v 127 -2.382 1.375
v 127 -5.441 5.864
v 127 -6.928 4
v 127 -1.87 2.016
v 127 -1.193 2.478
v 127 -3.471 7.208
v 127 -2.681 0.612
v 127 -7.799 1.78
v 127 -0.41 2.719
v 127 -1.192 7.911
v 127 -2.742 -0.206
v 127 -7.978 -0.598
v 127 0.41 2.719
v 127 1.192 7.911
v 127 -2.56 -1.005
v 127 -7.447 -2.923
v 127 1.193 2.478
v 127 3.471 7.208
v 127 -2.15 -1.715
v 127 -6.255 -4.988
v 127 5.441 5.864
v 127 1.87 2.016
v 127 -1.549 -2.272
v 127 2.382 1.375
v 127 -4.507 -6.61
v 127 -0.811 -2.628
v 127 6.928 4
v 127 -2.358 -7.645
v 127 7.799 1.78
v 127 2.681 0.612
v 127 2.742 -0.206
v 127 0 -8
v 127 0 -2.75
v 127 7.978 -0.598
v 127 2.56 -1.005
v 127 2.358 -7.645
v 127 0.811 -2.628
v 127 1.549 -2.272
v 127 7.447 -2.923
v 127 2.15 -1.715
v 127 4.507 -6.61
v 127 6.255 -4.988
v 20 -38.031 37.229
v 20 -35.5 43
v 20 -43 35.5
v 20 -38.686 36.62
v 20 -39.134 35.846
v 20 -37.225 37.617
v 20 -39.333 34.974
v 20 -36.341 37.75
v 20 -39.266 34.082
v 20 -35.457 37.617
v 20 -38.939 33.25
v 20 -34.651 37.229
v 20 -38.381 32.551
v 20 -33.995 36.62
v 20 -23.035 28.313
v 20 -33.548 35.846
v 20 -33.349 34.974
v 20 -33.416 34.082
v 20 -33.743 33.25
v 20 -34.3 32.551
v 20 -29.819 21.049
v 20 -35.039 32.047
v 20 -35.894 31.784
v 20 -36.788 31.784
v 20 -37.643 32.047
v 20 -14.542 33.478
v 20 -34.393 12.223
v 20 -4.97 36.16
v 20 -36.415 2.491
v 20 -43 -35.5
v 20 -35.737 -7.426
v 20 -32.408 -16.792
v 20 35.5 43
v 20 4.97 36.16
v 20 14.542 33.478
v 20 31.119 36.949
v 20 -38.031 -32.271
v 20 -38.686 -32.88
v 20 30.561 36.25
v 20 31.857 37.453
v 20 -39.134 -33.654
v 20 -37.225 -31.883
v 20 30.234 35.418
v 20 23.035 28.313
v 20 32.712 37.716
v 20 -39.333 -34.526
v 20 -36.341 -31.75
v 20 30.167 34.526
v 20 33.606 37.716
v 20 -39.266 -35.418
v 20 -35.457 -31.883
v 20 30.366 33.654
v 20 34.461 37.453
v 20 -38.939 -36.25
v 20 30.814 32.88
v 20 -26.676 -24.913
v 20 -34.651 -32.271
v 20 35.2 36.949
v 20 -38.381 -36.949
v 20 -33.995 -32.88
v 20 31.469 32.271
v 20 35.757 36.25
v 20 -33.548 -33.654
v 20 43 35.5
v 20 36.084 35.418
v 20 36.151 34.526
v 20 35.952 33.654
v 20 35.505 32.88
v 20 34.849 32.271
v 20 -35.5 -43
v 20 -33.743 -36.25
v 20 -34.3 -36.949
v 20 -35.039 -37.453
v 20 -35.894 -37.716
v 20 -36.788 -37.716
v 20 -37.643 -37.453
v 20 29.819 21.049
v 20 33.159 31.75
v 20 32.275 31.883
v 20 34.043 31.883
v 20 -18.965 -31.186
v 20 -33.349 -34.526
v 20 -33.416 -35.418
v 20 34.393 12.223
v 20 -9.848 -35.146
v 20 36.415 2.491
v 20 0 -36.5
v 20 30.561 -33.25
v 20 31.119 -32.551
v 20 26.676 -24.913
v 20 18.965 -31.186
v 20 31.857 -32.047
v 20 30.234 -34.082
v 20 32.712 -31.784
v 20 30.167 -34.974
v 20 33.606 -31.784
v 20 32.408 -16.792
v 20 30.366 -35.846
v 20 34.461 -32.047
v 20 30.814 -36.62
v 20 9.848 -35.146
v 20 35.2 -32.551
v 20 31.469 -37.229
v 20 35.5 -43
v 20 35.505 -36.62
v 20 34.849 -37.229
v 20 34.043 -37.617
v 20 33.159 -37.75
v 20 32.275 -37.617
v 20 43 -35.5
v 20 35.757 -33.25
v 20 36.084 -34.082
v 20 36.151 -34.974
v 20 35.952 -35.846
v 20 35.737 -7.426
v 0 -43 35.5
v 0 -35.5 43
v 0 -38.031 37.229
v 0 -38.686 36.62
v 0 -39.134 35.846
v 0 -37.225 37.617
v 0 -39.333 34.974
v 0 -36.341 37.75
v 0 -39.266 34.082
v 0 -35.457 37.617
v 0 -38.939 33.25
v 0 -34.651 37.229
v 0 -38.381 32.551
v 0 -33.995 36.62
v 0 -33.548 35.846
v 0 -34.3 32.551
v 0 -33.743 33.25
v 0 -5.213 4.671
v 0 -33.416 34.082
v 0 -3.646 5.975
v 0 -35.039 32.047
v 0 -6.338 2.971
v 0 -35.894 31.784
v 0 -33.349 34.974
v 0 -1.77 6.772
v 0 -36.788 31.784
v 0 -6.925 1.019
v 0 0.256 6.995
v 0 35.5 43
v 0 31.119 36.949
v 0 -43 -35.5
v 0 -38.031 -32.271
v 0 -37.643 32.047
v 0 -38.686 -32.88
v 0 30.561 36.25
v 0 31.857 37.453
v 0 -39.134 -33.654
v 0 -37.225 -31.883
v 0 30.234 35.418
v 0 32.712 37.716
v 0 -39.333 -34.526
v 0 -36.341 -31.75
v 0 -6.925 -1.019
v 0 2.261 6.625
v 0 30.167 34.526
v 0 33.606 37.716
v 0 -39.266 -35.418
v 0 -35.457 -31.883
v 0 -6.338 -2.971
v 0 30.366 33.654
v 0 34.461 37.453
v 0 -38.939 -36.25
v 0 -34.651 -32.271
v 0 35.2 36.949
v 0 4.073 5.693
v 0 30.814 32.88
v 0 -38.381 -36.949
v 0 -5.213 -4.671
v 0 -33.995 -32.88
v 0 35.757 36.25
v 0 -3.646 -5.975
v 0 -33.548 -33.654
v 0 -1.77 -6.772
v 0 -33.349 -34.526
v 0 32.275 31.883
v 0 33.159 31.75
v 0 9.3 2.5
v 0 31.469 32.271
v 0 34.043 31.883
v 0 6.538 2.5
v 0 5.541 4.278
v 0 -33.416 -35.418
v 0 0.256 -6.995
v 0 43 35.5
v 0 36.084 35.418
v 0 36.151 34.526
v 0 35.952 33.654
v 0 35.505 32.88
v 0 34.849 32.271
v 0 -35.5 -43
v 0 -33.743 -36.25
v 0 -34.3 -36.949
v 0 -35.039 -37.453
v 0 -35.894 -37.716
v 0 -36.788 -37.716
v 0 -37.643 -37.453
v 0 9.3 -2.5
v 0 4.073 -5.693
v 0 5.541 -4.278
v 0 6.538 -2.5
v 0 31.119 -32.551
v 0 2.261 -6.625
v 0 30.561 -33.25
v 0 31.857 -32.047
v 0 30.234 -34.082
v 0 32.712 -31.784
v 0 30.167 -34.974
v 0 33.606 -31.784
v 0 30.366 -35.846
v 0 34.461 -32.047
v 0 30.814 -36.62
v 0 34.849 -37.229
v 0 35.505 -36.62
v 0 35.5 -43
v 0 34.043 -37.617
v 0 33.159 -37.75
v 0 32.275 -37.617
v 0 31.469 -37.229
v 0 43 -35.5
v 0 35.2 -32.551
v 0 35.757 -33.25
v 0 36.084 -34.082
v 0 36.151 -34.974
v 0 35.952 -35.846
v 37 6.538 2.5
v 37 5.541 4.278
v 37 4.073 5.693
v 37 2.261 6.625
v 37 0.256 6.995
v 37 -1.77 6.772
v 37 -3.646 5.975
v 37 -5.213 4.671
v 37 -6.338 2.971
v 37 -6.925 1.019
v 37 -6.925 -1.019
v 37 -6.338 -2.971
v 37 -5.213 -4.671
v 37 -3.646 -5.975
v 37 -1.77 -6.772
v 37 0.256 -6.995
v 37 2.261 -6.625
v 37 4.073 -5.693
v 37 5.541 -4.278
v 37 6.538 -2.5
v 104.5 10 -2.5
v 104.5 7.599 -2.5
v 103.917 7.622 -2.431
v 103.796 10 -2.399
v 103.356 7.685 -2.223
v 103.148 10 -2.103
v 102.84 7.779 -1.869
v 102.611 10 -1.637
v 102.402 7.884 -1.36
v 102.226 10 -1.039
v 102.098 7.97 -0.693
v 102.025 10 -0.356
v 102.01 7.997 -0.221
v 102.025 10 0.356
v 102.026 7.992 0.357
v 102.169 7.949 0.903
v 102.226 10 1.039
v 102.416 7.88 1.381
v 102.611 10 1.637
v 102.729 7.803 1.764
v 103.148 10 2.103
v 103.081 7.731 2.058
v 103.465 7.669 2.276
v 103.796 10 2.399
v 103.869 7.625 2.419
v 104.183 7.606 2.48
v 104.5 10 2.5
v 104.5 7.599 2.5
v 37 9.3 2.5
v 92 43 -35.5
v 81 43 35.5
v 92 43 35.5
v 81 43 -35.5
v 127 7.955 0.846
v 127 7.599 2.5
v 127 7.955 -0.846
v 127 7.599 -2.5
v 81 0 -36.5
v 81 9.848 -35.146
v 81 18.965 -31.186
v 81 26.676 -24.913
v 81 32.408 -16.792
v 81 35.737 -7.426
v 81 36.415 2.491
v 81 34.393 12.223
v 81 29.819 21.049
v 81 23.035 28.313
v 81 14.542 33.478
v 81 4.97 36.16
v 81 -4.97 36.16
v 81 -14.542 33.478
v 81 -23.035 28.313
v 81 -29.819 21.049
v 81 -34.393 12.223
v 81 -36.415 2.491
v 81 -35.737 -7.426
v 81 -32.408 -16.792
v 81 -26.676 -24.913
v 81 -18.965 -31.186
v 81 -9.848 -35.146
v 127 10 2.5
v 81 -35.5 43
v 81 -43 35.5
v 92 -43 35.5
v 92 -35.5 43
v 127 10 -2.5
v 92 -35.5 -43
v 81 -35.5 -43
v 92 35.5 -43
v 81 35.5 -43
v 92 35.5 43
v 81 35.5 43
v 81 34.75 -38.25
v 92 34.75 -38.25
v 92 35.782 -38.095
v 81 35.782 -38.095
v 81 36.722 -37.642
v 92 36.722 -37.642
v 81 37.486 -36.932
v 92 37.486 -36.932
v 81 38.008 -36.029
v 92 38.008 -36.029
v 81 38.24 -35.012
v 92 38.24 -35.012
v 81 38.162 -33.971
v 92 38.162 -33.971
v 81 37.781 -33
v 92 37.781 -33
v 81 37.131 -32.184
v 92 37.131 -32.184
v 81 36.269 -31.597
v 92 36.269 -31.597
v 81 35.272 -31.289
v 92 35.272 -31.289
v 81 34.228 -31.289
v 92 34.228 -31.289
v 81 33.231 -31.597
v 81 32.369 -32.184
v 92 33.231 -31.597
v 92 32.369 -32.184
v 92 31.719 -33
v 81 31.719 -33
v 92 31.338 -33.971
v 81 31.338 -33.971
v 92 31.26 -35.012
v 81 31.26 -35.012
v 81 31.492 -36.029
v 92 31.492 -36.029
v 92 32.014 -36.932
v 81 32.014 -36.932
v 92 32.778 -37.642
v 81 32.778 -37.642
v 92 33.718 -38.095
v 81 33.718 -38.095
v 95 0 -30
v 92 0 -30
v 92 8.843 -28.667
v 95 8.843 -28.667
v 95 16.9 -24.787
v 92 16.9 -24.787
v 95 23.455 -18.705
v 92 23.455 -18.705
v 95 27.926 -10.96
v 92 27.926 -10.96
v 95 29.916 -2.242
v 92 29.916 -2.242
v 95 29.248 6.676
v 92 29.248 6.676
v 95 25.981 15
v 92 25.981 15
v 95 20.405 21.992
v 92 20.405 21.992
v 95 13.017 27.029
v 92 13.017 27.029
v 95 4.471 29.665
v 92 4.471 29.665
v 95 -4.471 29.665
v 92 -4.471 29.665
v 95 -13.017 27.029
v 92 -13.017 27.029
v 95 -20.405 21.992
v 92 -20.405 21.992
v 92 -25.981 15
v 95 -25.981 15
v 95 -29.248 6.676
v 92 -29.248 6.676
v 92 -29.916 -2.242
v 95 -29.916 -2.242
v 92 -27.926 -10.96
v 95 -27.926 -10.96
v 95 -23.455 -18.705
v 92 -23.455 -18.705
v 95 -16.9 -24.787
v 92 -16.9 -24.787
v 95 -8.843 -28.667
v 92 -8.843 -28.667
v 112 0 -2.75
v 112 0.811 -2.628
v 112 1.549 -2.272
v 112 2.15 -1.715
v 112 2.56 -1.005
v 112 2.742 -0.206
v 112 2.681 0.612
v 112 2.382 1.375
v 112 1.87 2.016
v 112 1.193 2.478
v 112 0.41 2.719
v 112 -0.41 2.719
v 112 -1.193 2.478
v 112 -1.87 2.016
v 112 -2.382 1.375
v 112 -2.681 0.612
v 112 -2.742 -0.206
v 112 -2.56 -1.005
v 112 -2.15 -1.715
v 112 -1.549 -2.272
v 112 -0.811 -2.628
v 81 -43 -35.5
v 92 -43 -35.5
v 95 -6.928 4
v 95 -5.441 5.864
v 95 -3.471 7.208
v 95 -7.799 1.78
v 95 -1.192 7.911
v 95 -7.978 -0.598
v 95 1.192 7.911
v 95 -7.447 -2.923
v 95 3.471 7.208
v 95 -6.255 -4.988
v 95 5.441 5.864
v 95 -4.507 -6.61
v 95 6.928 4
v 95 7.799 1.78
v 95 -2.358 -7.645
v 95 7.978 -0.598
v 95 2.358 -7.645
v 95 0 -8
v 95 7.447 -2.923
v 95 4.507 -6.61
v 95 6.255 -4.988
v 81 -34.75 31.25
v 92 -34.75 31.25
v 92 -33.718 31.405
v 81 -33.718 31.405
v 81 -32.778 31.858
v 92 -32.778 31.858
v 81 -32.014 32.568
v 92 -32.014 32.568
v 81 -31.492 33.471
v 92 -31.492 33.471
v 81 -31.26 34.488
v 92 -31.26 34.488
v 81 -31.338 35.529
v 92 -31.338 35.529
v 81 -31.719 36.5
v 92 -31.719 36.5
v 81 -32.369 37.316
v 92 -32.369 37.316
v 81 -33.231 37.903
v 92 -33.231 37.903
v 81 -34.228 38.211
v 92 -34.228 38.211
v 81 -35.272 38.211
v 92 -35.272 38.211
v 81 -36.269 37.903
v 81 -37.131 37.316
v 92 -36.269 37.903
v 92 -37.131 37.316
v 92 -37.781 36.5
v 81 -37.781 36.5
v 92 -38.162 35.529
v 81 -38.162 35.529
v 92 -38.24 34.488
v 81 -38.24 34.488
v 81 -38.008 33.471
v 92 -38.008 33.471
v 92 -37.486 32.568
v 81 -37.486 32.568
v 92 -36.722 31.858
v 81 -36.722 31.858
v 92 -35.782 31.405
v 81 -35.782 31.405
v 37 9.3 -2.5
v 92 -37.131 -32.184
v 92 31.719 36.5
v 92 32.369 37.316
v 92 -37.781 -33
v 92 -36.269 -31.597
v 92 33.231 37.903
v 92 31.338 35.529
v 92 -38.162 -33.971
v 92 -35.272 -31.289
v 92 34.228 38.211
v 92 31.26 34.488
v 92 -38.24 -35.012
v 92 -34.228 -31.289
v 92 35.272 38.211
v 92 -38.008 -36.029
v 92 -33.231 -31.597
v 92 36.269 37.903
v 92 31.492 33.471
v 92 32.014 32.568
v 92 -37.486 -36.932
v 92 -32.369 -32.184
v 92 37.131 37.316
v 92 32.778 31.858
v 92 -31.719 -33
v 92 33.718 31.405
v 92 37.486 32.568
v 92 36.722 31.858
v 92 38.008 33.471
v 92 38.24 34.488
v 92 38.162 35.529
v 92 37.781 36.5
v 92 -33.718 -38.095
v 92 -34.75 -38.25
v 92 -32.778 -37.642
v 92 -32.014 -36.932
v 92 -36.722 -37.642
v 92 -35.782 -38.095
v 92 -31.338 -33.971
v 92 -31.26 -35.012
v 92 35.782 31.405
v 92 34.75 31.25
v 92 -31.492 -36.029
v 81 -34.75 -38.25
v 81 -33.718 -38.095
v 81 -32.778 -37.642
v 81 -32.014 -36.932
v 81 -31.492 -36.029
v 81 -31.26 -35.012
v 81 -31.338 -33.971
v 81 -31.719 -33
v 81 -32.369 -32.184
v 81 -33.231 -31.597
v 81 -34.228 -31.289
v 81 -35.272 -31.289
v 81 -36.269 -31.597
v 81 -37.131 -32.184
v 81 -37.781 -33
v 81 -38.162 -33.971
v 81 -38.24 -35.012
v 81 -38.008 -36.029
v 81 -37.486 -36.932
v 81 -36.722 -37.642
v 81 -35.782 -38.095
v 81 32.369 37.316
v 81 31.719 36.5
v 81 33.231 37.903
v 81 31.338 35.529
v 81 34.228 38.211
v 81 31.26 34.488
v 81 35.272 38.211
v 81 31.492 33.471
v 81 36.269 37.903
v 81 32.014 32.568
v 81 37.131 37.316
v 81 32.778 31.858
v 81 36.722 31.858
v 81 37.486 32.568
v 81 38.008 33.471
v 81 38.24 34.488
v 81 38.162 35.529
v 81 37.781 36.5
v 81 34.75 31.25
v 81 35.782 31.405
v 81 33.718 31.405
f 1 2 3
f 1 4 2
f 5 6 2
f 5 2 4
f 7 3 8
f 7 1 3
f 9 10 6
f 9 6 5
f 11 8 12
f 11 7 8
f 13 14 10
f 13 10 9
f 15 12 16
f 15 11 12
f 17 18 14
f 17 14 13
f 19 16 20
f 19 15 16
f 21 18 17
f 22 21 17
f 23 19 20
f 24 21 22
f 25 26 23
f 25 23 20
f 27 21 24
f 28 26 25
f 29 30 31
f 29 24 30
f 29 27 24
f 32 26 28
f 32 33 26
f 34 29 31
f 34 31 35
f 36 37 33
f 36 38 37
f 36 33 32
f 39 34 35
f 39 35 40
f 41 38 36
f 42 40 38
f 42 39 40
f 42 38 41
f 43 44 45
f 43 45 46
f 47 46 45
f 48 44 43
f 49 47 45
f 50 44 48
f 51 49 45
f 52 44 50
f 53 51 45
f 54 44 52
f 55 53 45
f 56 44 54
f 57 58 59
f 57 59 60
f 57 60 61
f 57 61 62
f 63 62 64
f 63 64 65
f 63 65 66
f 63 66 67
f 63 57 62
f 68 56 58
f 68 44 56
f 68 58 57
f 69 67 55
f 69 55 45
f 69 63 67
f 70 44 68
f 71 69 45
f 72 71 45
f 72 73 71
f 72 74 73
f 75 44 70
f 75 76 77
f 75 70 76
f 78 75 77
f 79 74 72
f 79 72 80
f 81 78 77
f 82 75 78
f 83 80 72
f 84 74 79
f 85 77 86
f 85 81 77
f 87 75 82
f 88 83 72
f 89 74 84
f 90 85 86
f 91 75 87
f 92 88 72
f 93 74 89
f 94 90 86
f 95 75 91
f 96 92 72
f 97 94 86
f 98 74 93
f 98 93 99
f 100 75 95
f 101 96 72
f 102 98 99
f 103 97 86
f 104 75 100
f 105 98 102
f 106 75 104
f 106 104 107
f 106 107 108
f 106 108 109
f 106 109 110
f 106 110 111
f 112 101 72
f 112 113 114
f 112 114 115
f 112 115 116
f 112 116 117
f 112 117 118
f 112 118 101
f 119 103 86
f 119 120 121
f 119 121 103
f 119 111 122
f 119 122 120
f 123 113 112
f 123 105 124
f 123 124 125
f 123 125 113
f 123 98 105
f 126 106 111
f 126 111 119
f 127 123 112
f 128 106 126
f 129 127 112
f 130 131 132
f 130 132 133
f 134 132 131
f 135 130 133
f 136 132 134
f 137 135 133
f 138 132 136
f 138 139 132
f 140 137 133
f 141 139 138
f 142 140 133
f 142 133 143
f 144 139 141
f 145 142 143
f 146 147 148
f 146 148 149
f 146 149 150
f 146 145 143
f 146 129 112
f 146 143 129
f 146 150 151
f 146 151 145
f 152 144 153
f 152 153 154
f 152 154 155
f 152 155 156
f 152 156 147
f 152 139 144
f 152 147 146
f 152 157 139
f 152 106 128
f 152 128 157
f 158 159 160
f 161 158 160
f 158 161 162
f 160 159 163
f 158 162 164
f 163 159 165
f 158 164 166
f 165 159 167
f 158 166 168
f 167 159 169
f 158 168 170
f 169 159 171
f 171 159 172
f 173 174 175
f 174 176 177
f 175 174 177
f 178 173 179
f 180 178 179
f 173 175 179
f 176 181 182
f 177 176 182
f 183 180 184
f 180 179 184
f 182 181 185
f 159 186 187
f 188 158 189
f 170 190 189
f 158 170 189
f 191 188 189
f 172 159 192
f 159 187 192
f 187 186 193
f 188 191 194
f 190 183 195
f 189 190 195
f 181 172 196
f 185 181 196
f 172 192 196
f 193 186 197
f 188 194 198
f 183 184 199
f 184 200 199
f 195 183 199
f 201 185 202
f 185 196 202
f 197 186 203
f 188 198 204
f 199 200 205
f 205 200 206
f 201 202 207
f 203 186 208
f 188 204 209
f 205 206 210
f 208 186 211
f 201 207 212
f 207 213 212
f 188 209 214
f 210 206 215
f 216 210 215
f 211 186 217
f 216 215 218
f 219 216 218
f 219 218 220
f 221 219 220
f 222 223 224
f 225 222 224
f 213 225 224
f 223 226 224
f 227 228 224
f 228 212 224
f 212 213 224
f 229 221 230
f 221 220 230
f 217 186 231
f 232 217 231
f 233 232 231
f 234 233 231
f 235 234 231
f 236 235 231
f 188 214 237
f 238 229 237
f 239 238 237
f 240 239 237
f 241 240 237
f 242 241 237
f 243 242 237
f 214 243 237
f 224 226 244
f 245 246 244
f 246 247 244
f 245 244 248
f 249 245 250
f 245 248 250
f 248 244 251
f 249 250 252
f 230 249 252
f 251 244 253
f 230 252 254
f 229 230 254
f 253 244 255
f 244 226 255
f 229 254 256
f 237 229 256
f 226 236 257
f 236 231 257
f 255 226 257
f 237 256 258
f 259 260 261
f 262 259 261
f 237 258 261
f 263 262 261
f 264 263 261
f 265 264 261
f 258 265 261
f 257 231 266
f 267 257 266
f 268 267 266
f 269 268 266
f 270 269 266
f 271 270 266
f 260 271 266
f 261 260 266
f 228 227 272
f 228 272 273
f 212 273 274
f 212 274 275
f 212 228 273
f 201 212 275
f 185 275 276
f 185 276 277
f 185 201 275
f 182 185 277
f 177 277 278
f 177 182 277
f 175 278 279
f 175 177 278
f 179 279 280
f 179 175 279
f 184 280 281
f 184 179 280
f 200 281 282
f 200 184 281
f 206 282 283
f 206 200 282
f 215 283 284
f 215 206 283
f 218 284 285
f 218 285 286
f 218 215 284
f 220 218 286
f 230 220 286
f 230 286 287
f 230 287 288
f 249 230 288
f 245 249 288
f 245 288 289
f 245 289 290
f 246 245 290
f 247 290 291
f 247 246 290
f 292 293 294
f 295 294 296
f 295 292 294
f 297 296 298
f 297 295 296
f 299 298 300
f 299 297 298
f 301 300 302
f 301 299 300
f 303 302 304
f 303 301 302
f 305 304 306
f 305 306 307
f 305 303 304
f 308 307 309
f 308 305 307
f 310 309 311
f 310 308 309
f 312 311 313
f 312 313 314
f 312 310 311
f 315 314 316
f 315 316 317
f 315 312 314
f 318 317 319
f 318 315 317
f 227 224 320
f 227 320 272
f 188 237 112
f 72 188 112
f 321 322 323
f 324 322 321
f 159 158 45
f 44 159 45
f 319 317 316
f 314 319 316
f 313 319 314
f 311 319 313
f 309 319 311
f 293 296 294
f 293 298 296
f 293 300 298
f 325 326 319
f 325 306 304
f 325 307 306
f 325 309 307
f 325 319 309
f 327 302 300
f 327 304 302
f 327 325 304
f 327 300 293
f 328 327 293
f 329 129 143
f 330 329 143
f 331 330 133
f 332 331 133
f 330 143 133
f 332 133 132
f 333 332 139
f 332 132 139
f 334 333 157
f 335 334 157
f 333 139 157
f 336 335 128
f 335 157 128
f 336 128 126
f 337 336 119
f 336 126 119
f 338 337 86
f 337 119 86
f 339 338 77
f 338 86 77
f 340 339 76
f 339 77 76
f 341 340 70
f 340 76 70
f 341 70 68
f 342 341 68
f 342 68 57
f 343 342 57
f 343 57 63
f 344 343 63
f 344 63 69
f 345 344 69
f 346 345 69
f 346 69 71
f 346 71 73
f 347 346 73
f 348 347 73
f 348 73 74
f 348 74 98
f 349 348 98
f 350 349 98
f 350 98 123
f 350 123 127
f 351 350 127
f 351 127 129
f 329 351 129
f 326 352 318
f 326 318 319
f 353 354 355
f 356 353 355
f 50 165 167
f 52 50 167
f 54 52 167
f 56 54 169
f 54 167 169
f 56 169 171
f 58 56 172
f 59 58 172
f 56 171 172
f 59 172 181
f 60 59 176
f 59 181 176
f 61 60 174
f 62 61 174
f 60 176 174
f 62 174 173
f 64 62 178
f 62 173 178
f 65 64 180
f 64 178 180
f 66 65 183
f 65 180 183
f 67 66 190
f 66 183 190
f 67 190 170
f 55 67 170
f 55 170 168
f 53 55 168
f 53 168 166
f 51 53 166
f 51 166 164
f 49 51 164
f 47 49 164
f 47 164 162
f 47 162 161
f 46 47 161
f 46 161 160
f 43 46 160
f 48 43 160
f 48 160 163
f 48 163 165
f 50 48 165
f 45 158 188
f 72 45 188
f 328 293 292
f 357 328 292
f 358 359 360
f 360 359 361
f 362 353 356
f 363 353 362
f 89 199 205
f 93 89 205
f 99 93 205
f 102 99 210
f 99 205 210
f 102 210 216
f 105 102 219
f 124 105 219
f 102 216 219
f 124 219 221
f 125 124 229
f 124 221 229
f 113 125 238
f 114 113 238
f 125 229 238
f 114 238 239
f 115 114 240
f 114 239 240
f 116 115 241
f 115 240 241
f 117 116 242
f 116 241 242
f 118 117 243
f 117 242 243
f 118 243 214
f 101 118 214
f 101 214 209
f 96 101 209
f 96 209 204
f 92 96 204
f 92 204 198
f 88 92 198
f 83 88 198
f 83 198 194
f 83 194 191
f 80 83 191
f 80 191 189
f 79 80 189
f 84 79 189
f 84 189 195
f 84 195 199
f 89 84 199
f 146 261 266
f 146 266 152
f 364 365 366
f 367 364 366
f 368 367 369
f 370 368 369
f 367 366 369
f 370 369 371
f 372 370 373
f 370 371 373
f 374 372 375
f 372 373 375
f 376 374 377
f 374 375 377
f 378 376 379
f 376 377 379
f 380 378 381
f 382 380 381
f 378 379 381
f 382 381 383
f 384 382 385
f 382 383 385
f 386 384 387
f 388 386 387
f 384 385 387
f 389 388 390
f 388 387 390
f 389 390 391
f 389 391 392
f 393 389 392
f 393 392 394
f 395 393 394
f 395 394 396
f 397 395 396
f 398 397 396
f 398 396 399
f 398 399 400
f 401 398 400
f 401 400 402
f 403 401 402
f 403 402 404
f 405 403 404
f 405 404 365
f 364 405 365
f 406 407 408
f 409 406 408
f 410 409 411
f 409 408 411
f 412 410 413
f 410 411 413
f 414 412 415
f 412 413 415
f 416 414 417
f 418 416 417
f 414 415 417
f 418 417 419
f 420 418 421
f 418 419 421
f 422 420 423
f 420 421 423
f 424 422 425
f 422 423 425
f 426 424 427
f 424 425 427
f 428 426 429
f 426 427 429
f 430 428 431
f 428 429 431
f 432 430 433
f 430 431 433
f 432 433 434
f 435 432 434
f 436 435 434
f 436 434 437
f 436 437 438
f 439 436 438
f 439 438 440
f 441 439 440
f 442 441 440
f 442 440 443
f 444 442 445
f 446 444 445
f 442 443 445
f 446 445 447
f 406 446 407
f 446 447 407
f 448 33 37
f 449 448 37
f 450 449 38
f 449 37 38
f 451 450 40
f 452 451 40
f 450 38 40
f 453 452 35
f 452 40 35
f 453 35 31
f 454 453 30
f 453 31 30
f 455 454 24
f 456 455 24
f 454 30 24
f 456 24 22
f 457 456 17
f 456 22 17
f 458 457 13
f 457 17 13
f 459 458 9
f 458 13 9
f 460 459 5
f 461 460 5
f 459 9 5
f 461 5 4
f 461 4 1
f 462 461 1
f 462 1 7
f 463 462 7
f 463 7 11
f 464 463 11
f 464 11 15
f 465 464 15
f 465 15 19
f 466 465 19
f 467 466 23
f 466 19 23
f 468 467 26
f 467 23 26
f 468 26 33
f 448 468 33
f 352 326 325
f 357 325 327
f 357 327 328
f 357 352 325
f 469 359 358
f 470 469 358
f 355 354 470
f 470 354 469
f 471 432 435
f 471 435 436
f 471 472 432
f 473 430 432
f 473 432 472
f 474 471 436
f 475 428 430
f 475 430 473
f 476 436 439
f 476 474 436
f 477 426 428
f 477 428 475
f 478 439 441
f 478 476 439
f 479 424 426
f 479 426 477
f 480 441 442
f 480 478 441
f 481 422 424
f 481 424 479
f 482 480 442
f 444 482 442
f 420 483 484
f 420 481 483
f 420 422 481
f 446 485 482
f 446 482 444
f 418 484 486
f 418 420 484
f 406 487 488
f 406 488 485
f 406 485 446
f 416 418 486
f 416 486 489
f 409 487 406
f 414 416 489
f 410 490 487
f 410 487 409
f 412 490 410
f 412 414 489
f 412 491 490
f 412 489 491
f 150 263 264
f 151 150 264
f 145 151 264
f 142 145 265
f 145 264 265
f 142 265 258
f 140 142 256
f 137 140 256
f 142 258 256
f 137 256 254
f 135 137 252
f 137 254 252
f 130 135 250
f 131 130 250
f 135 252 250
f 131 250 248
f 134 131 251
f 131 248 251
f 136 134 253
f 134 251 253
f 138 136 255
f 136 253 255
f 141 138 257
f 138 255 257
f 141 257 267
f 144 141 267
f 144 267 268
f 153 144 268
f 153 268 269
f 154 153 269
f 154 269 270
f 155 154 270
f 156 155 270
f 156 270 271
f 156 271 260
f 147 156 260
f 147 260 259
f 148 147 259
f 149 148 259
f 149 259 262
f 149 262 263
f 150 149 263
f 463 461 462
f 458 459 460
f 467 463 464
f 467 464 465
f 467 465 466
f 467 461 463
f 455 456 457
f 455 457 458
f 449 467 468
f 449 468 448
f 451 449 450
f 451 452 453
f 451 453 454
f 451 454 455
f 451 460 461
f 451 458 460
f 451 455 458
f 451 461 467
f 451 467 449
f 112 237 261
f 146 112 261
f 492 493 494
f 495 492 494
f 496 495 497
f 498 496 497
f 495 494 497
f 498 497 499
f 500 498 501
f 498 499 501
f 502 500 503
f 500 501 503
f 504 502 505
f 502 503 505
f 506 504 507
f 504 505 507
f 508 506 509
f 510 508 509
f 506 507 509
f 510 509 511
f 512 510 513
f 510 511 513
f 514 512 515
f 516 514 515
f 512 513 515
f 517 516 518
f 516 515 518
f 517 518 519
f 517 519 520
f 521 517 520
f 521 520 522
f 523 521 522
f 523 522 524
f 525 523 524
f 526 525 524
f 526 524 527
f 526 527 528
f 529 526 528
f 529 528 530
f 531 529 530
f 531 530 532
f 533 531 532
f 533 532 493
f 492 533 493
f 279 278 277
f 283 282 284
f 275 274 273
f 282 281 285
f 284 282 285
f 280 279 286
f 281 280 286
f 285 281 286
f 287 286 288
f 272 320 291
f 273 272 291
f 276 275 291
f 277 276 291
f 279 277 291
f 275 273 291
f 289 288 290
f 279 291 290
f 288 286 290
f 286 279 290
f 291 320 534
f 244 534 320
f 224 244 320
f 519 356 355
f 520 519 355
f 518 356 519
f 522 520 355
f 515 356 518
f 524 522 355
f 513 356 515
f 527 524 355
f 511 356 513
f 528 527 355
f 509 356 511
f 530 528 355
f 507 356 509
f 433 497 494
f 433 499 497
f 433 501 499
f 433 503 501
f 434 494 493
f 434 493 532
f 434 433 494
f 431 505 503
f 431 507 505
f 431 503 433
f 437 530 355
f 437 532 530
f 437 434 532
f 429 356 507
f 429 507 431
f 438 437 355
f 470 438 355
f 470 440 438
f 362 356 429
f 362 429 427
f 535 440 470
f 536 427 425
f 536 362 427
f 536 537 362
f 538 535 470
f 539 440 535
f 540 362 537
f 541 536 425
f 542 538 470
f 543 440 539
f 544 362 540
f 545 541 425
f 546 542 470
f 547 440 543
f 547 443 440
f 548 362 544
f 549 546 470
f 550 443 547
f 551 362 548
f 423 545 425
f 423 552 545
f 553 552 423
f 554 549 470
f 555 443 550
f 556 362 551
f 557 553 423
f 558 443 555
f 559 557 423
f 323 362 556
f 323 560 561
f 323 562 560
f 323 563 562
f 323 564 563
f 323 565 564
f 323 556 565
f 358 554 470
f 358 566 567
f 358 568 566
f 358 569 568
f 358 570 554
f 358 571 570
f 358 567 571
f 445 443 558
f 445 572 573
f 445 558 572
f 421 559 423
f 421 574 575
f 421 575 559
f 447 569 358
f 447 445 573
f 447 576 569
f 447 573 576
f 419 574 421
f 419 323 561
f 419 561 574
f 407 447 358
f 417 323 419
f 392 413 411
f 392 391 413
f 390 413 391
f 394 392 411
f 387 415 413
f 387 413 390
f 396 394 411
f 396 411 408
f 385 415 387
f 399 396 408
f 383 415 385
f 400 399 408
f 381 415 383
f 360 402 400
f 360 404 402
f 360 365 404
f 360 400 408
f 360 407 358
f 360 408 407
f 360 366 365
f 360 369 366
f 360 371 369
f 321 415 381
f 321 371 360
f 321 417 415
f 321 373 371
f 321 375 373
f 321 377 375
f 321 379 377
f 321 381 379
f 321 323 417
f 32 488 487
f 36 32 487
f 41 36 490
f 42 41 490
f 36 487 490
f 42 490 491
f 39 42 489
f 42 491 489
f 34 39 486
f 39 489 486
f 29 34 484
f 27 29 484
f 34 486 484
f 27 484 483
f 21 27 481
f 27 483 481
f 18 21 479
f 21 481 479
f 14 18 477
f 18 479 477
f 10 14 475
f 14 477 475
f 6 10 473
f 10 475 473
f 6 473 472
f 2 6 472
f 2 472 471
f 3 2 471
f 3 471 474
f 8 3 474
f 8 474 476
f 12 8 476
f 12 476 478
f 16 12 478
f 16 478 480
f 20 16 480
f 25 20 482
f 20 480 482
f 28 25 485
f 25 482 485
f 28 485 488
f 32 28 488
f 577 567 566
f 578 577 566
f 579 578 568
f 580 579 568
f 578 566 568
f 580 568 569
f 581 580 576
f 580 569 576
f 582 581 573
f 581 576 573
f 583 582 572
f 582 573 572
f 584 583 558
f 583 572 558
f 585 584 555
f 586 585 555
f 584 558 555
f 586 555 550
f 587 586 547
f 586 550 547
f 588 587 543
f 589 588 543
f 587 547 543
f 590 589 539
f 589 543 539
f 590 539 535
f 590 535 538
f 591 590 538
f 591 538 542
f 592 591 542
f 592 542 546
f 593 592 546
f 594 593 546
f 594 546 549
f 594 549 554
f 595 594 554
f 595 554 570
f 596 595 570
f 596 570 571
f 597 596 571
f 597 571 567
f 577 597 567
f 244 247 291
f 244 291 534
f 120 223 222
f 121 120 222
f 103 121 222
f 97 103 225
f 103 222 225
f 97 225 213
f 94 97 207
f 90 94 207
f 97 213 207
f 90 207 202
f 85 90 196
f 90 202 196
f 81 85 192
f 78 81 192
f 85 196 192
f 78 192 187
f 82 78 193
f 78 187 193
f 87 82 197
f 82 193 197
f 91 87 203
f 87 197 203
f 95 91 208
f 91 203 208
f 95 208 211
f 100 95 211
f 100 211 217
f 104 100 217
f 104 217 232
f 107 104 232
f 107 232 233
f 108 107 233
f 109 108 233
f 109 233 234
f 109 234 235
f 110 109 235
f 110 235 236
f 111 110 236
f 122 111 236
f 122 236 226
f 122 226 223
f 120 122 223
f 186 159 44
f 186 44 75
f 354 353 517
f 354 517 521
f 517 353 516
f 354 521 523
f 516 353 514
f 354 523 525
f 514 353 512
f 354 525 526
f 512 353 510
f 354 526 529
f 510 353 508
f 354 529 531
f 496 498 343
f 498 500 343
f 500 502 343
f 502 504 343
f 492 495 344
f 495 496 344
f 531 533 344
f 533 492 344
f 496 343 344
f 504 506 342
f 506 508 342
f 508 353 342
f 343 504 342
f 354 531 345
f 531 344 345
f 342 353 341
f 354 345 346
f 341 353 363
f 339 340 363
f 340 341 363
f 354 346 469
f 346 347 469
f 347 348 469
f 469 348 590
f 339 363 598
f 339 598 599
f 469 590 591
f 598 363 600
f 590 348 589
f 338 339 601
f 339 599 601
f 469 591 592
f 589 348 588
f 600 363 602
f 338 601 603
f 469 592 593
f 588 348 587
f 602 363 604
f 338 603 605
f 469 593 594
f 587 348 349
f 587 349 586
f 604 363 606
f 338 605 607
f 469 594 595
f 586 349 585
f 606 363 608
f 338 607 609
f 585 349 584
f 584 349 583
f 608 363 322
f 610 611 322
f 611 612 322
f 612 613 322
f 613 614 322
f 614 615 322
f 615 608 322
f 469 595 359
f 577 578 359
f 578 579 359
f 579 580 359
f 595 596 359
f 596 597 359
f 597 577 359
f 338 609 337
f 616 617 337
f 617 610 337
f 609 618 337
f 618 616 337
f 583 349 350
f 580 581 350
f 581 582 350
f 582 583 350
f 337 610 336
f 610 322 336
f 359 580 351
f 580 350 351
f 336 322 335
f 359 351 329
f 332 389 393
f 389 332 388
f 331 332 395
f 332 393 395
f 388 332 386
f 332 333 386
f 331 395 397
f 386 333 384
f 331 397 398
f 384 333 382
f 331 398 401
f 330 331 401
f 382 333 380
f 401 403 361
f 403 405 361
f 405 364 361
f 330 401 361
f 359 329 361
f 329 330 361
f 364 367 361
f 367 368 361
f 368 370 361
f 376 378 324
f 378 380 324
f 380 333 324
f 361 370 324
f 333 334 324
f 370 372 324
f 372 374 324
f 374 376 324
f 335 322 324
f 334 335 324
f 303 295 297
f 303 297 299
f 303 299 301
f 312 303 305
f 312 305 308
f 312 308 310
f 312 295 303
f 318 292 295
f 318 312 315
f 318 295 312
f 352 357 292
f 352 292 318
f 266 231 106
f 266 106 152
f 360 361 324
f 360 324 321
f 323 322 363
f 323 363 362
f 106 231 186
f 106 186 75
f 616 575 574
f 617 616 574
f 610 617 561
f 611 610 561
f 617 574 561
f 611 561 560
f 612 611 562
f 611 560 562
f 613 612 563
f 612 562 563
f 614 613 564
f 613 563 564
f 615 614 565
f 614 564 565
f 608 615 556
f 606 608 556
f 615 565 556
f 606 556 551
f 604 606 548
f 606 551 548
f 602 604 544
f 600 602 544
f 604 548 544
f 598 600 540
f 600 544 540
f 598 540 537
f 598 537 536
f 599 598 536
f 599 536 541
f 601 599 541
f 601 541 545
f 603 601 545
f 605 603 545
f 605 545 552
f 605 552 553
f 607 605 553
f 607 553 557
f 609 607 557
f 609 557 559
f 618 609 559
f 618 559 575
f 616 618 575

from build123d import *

# Parameters (mm, degrees)
SKETCH1_R               = 36.5
BOSS_EXTRUDE1_DEPTH     = 81
SKETCH1_3_W             = 86
SKETCH1_3_H             = 86
SKETCH1_3_R             = 36.5
BOSS_EXTRUDE2_DEPTH     = 20
CUT_EXTRUDE1_DEPTH      = 37
SKETCH4_W               = 86
SKETCH4_H               = 86
BOSS_EXTRUDE3_DEPTH     = 11
SKETCH5_R               = 30
BOSS_EXTRUDE4_DEPTH     = 3
SKETCH6_R               = 8
BOSS_EXTRUDE6_DEPTH     = 32
BOSS_EXTRUDE8_DEPTH     = 32
CUT_EXTRUDE3_REACH      = 146.177
CUT_EXTRUDE3_END_RADIUS = 8
CHAMFER1_SIZE           = 7.5
SKETCH13_R              = 3.5
CUT_EXTRUDE7_DEPTH      = 32
SKETCH14_R              = 3
CUT_EXTRUDE8_DEPTH      = 32
SKETCH16_R              = 2.75
CUT_EXTRUDE9_DEPTH      = 15


with BuildPart() as part:
    # Sketch1 → Boss-Extrude1 (new body)
    with BuildSketch(Plane(origin=(0, 0, 0), x_dir=(0, 0, -1), z_dir=(1, 0, 0))):
        Circle(SKETCH1_R)
    extrude(amount=BOSS_EXTRUDE1_DEPTH)

    # Sketch1<3> → Boss-Extrude2 (add)
    with BuildSketch(Plane(origin=(0, 0, 0), x_dir=(0, 0, -1), z_dir=(1, 0, 0))):
        Rectangle(SKETCH1_3_W, SKETCH1_3_H)
        Circle(SKETCH1_3_R, mode=Mode.SUBTRACT)
    extrude(amount=BOSS_EXTRUDE2_DEPTH)

    # Sketch2 → Cut-Extrude1 (cut)
    with BuildSketch(Plane.ZY):
        with BuildLine():
            Line((-2.5, 9.3), (2.5, 9.3))
            Line((2.5, 9.3), (2.5, 6.538348415))
            ThreePointArc((2.5, 6.538348415), (0, -7), (-2.5, 6.538348415))
            Line((-2.5, 6.538348415), (-2.5, 9.3))
        make_face()
    extrude(amount=-CUT_EXTRUDE1_DEPTH, mode=Mode.SUBTRACT)

    # Sketch4 → Boss-Extrude3 (add)
    with BuildSketch(Plane(origin=(81, 0, 0), x_dir=(0, 0, -1), z_dir=(1, 0, 0))):
        Rectangle(SKETCH4_W, SKETCH4_H)
    extrude(amount=BOSS_EXTRUDE3_DEPTH)

    # Sketch5 → Boss-Extrude4 (add)
    with BuildSketch(Plane(origin=(92, 0, 0), x_dir=(0, 0, -1), z_dir=(1, 0, 0))):
        Circle(SKETCH5_R)
    extrude(amount=BOSS_EXTRUDE4_DEPTH)

    # Sketch6 → Boss-Extrude6 (add)
    with BuildSketch(Plane(origin=(95, 0, 0), x_dir=(0, 0, -1), z_dir=(1, 0, 0))):
        Circle(SKETCH6_R)
    extrude(amount=BOSS_EXTRUDE6_DEPTH)

    # Chamfer1
    chamfer1_edges = [part.edges().sort_by_distance(p)[0] for p in [
        (10, -43, 43),
        (86.5, -43, 43),
        (86.5, -43, -43),
        (10, -43, -43),
        (10, 43, -43),
        (86.5, 43, -43),
        (86.5, 43, 43),
        (10, 43, 43),
    ]]
    chamfer(chamfer1_edges, length=CHAMFER1_SIZE)

    # Sketch13 → Cut-Extrude7 (cut)
    with BuildSketch(Plane(origin=(92, 0, 0), x_dir=(0, 0, -1), z_dir=(1, 0, 0))):
        with Locations((-34.75, -34.75)):
            Circle(SKETCH13_R)
        with Locations((34.75, -34.75)):
            Circle(SKETCH13_R)
        with Locations((34.75, 34.75)):
            Circle(SKETCH13_R)
        with Locations((-34.75, 34.75)):
            Circle(SKETCH13_R)
    extrude(amount=-CUT_EXTRUDE7_DEPTH, mode=Mode.SUBTRACT)

    # Sketch14 → Cut-Extrude8 (cut)
    with BuildSketch(Plane.ZY):
        with Locations((-34.75, -36.340956328)):
            Circle(SKETCH14_R)
        with Locations((34.75, -36.340956328)):
            Circle(SKETCH14_R)
        with Locations((34.75, 33.159043672)):
            Circle(SKETCH14_R)
        with Locations((-34.75, 33.159043672)):
            Circle(SKETCH14_R)
    extrude(amount=-CUT_EXTRUDE8_DEPTH, mode=Mode.SUBTRACT)

    # Sketch16 → Cut-Extrude9 (cut)
    with BuildSketch(Plane(origin=(127, 0, 0), x_dir=(0, 0, -1), z_dir=(1, 0, 0))):
        Circle(SKETCH16_R)
    extrude(amount=-CUT_EXTRUDE9_DEPTH, mode=Mode.SUBTRACT)


with BuildPart() as body_2:
    # Sketch8 → Boss-Extrude8 (new body)
    with BuildSketch(Plane(origin=(127, 0, 0), x_dir=(0, 0, -1), z_dir=(1, 0, 0))):
        with BuildLine():
            Line((2.5, 10), (-2.5, 10))
            Line((-2.5, 10), (-2.5, 7.599342077))
            ThreePointArc((-2.5, 7.599342077), (0, 8), (2.5, 7.599342077))
            Line((2.5, 7.599342077), (2.5, 10))
        make_face()
    extrude(amount=-BOSS_EXTRUDE8_DEPTH)

    # Cut-Extrude3: up to this cylinder (the profile starts outside it)
    cut_extrude3_end = Plane(origin=(98.788909, 0, 0), z_dir=(-1, 0, 0)) * Cylinder(CUT_EXTRUDE3_END_RADIUS, 309.354, mode=Mode.PRIVATE)
    # Sketch10 → Cut-Extrude3 (cut, up to the surface)
    with BuildSketch(Plane(origin=(0, 10, 0), x_dir=(1, 0, 0), z_dir=(0, 1, 0)), mode=Mode.PRIVATE) as cut_extrude3_sk1:
        with BuildLine():
            Line((104.5, -2.5), (95, -2.5))
            Line((95, -2.5), (95, 2.5))
            Line((95, 2.5), (104.5, 2.5))
            ThreePointArc((104.5, 2.5), (102, 0), (104.5, -2.5))
        make_face()
    cut_extrude3_tool1 = extrude(cut_extrude3_sk1.sketch, amount=-CUT_EXTRUDE3_REACH, mode=Mode.PRIVATE) - cut_extrude3_end
    add(cut_extrude3_tool1.solids().sort_by_distance((98.788909, 10, 0))[0], mode=Mode.SUBTRACT)


solid = Compound([part.part, body_2.part])
